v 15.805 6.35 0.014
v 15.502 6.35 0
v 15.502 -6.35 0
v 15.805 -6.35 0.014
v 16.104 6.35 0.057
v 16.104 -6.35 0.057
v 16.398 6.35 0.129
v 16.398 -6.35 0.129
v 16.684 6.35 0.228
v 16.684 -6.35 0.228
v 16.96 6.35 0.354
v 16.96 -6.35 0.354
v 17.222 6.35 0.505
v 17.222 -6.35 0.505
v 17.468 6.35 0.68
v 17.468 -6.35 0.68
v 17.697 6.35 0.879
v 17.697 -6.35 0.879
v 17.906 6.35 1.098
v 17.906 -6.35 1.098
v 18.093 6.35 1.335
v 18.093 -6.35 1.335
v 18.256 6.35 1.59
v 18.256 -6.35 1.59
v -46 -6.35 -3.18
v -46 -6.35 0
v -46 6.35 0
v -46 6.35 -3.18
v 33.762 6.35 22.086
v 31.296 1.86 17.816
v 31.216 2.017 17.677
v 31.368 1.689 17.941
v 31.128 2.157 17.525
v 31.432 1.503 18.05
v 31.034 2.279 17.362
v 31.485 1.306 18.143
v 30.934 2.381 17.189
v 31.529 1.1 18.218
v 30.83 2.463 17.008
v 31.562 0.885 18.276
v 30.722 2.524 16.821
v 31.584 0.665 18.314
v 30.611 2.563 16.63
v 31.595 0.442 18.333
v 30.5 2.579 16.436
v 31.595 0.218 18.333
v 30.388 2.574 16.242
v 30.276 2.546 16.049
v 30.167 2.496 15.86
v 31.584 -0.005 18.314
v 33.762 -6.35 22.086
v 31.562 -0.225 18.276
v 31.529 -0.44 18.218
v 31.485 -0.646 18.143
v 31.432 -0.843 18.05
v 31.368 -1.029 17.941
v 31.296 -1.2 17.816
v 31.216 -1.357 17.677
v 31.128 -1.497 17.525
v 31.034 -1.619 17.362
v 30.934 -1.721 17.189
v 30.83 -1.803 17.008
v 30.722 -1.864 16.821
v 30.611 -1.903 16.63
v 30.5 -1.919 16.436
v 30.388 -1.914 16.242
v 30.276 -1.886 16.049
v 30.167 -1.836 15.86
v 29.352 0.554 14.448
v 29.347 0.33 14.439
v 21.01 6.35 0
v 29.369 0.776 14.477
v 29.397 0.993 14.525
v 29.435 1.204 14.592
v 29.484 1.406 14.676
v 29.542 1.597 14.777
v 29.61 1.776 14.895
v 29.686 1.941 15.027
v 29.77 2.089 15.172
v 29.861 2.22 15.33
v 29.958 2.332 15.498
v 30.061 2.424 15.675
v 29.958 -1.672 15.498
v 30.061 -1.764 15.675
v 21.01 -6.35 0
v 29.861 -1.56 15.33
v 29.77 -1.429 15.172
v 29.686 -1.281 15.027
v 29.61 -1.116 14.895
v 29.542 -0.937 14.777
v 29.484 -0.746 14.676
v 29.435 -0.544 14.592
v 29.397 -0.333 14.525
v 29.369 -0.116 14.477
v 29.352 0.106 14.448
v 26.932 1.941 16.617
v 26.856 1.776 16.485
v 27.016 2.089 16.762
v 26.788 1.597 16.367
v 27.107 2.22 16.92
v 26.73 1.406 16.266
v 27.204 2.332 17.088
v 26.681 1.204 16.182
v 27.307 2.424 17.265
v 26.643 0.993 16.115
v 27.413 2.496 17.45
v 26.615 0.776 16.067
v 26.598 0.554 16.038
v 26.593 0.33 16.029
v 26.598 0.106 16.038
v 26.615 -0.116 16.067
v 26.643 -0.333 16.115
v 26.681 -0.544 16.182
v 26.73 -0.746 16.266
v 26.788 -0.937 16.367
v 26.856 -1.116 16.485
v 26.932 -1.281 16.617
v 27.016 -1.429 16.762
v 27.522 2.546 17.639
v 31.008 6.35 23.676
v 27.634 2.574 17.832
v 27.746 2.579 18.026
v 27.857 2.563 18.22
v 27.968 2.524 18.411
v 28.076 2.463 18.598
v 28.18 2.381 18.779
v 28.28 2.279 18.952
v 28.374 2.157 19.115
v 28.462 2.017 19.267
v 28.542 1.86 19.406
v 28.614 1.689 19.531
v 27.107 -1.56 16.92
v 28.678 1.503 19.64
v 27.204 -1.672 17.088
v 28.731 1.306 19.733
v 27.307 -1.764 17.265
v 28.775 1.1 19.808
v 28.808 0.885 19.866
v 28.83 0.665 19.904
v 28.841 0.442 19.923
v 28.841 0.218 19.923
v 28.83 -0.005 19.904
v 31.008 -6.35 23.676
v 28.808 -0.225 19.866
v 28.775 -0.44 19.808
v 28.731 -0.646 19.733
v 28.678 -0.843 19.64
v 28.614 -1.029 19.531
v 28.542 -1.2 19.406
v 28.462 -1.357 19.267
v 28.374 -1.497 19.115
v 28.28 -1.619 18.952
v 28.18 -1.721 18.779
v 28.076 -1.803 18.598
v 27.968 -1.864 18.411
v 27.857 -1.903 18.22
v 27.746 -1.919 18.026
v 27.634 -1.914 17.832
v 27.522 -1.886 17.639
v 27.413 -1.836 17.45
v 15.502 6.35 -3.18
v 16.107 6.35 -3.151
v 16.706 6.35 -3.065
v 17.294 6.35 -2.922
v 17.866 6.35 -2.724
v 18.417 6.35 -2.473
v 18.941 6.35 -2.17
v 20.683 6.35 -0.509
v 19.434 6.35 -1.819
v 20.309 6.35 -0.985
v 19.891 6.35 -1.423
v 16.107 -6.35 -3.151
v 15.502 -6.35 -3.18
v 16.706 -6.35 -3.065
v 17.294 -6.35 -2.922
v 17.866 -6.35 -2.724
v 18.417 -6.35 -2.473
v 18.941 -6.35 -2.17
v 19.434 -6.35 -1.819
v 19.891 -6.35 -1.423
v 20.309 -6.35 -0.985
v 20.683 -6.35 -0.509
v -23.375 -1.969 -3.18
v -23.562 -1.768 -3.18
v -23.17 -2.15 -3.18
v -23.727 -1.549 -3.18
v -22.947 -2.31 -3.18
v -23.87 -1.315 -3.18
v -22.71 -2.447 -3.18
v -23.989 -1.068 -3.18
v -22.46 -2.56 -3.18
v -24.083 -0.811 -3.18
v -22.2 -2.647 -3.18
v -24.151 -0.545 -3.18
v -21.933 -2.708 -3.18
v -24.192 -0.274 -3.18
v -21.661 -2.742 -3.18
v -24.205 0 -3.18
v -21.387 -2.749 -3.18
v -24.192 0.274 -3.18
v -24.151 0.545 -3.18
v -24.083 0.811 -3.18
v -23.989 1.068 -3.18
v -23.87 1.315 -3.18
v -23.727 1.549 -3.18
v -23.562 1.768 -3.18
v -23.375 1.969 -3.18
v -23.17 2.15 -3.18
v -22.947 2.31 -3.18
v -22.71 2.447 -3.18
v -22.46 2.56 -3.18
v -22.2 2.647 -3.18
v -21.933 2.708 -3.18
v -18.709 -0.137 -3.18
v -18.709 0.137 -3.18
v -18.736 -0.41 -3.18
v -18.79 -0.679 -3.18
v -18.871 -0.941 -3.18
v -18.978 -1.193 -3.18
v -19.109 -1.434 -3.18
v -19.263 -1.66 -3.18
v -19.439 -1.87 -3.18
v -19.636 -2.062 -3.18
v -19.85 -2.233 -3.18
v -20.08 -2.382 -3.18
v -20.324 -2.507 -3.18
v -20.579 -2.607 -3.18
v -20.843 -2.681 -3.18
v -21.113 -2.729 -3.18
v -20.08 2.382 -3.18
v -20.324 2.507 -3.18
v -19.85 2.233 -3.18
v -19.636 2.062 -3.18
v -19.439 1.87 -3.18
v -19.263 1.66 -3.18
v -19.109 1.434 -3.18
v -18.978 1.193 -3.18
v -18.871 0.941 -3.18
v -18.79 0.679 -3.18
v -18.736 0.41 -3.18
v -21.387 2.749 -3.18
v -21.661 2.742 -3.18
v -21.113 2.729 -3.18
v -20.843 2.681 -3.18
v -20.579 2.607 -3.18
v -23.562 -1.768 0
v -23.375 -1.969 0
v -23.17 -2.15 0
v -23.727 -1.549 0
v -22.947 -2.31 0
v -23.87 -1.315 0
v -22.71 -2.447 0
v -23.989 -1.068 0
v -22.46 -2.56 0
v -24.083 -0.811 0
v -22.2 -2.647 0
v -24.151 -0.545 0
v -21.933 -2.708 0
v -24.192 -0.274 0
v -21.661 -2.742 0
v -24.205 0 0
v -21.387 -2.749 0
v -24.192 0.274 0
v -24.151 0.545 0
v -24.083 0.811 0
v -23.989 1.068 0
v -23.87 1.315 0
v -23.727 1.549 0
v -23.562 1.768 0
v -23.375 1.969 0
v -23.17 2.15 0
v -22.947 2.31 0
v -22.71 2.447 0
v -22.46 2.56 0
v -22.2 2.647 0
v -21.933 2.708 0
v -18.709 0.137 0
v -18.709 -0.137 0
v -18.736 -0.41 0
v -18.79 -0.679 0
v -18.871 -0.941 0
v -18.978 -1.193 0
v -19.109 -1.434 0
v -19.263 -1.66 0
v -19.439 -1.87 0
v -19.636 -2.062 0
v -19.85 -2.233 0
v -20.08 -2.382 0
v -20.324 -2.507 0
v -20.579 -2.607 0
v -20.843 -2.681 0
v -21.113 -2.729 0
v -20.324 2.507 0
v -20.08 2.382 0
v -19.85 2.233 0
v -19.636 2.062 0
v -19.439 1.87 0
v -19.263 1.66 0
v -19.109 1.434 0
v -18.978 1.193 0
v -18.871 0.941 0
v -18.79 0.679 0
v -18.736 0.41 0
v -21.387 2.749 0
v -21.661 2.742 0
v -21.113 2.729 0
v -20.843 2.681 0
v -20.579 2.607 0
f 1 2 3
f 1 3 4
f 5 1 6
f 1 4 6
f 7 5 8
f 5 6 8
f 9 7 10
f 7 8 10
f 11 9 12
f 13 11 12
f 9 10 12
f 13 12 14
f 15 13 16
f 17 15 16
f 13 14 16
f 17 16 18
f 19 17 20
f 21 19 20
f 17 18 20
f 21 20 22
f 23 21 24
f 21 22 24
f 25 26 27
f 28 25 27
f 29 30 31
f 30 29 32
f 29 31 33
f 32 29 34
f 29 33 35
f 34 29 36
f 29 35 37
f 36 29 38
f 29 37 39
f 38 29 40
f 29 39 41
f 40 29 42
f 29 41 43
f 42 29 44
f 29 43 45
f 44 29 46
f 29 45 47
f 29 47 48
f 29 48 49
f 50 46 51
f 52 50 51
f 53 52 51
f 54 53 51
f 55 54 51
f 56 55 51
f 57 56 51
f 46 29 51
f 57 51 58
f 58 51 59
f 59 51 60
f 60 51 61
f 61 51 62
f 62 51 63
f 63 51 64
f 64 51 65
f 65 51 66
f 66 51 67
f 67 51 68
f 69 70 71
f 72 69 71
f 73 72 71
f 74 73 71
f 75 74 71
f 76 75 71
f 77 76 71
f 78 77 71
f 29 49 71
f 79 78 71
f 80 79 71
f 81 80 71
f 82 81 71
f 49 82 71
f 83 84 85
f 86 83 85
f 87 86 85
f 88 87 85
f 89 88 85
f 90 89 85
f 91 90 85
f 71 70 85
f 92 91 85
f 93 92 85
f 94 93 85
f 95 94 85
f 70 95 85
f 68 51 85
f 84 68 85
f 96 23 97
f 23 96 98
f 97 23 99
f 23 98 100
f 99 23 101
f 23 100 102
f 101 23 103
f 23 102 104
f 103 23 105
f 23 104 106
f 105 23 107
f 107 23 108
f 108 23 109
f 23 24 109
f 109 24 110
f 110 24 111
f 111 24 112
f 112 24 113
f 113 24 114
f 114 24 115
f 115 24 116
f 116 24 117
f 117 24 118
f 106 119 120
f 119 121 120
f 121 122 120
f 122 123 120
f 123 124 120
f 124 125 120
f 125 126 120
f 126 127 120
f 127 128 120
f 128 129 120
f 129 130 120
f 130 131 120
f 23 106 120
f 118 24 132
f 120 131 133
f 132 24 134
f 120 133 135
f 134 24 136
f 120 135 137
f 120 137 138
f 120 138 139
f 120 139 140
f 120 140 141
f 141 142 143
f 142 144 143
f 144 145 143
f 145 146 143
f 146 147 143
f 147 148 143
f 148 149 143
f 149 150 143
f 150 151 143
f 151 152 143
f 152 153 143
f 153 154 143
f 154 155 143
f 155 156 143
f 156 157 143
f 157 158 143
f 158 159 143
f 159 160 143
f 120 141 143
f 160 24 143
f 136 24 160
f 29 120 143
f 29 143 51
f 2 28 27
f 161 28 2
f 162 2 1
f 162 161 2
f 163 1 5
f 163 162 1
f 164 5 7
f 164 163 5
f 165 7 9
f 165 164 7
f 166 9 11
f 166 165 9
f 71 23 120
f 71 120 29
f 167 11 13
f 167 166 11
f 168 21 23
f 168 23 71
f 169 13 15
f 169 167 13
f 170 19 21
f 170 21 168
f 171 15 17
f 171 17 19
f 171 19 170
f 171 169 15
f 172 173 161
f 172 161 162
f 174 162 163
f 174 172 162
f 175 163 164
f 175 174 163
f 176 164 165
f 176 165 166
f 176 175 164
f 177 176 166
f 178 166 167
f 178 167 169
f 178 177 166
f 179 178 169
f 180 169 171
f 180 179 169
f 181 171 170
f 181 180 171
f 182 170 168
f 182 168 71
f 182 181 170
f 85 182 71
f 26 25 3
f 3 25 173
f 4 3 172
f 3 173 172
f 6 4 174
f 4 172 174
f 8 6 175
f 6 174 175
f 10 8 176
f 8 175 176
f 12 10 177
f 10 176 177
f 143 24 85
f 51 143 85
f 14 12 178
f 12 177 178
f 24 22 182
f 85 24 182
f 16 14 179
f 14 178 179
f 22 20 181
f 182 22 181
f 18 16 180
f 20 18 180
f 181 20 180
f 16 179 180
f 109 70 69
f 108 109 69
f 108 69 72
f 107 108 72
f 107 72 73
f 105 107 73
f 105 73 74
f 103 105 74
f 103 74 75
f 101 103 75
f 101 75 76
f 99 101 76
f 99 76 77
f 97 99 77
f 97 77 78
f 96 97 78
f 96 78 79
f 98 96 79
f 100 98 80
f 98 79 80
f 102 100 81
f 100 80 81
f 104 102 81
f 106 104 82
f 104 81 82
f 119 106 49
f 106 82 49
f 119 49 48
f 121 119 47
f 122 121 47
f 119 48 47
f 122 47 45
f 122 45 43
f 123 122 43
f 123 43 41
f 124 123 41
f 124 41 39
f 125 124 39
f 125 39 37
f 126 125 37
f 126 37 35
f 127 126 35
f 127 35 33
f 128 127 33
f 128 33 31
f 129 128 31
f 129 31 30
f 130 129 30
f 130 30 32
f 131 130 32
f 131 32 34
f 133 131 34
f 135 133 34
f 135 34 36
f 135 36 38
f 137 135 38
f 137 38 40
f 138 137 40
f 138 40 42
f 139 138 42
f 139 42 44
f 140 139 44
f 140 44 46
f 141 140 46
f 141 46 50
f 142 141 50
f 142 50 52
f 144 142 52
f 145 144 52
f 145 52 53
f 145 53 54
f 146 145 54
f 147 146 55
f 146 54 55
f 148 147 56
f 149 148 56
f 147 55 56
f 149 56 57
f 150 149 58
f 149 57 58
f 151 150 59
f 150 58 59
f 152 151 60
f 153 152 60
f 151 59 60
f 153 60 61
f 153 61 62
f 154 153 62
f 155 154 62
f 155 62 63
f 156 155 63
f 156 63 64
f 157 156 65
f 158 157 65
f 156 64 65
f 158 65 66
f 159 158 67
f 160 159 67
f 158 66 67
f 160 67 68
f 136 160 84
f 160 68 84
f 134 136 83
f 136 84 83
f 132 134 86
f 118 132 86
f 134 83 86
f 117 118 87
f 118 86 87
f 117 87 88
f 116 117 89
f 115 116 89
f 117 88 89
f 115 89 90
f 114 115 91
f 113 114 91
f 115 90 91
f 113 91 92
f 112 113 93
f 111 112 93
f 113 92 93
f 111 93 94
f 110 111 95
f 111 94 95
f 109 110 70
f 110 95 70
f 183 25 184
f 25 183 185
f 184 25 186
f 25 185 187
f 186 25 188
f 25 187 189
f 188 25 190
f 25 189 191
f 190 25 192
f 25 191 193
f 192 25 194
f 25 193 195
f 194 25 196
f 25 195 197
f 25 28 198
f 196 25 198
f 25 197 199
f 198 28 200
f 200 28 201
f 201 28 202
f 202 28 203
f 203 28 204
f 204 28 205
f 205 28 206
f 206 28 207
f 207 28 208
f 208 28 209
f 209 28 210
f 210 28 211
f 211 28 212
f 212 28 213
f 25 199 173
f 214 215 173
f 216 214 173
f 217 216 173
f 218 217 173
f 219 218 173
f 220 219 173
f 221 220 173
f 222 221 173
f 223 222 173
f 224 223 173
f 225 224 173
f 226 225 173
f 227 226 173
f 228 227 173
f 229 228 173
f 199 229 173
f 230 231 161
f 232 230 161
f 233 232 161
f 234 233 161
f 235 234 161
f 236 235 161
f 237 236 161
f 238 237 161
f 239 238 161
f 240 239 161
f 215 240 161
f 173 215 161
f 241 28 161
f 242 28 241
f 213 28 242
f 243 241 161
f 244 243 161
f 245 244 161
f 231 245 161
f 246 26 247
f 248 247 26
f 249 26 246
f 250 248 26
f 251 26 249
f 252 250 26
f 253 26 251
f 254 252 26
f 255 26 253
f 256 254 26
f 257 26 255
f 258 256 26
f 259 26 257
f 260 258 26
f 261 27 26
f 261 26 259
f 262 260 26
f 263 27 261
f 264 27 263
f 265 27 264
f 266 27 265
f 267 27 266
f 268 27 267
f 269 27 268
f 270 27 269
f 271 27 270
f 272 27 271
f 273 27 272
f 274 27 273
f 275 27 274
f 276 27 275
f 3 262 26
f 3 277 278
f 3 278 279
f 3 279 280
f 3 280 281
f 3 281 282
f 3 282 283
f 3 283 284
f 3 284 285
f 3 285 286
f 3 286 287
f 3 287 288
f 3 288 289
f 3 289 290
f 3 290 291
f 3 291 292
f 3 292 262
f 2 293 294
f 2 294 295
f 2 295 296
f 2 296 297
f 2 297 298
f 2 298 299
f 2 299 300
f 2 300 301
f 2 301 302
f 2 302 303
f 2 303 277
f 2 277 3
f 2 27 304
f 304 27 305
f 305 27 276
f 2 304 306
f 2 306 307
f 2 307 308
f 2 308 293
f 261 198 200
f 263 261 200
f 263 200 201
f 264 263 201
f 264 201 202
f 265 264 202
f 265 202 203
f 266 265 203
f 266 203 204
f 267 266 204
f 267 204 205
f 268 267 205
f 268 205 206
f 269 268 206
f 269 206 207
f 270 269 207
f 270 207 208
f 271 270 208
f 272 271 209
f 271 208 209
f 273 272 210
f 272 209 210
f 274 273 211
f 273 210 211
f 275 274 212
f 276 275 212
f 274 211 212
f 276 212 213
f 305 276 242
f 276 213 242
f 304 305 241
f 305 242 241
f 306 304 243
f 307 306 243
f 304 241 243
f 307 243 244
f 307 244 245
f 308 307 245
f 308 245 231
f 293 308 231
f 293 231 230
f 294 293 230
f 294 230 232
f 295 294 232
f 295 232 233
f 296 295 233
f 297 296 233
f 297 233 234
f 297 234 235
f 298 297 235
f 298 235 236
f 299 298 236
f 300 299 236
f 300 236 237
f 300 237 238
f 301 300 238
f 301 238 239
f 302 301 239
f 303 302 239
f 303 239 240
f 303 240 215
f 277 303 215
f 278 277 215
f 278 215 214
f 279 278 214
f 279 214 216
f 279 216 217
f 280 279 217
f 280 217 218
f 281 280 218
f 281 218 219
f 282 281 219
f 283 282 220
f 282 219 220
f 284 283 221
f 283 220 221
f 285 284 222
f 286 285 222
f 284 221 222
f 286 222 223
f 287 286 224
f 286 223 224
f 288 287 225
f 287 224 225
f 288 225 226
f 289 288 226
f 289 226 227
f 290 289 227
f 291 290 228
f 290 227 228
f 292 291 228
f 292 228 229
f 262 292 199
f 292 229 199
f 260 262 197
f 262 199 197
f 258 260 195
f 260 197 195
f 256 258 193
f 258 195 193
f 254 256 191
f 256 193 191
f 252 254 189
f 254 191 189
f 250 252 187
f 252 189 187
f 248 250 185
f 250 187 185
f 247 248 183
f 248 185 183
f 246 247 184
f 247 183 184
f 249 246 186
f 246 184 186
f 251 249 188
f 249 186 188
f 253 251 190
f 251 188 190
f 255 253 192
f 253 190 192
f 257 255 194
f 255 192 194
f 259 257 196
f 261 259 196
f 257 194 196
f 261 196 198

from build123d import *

# Parameters (mm, degrees)
ESBO_O1_W               = 92
ESBO_O1_H               = 12.7
FLANGE_BASE1_DEPTH      = 3.18
DOBRA_START             = -6.35
DOBRA_ESBO_ADA1_DEPTH   = 12.7
DOBRA_ESBO_ADA1_2_DEPTH = 12.7
ESBO_O8_R               = 2.75
CORTE_EXTRUS_O1_DEPTH   = 10
ESBO_O10_R              = 2.25
CORTE_EXTRUS_O3_DEPTH   = 10


# Read off the part's stored shape, not the designer's step: Dobra esboçada1
# Sheet-metal steps are written as plain solids
with BuildPart() as part:
    # Esboço1 → Flange-base1 (new body)
    with BuildSketch(Plane.XY):
        Rectangle(ESBO_O1_W, ESBO_O1_H)
    extrude(amount=-FLANGE_BASE1_DEPTH)

    # Dobra esboçada1 outline → Dobra esboçada1 (cut)
    with BuildSketch(Plane(origin=(0, 0, 0), x_dir=(1, 0, 0), z_dir=(0, 1, 0)).offset(DOBRA_START)):
        with BuildLine():
            ThreePointArc((15.50243384, 3.18), (18.68243384, 2.327921568), (21.010355408, 0))
            Line((21.010355408, 0), (46, 0))
            Line((46, 0), (46, 3.18))
            Line((46, 3.18), (15.50243384, 3.18))
        make_face()
    extrude(amount=DOBRA_ESBO_ADA1_DEPTH, mode=Mode.SUBTRACT)

    # Dobra esbo_ada1 2 outline → Dobra esbo_ada1 2 (add)
    with BuildSketch(Plane(origin=(0, 0, 0), x_dir=(1, 0, 0), z_dir=(0, 1, 0)).offset(DOBRA_START)):
        with BuildLine():
            Line((18.256394624, -1.59), (31.007611545, -23.675755564))
            Line((31.007611545, -23.675755564), (33.761572329, -22.085755564))
            Line((33.761572329, -22.085755564), (21.010355408, 0))
            Line((21.010355408, 0), (15.50243384, 0))
            ThreePointArc((15.50243384, 0), (17.09243384, -0.426039216), (18.256394624, -1.59))
        make_face()
    extrude(amount=DOBRA_ESBO_ADA1_2_DEPTH)

    # Esboço8 → Corte-extrusão1 (cut)
    with BuildSketch(Plane(origin=(0, 0, -3.18), x_dir=(-1, 0, 0), z_dir=(0, 0, -1))):
        with Locations((21.455259123, 0)):
            Circle(ESBO_O8_R)
    extrude(amount=-CORTE_EXTRUS_O1_DEPTH, mode=Mode.SUBTRACT)

    # Esboço10 → Corte-extrusão3 (cut)
    with BuildSketch(Plane(origin=(15.757766556, 0, -9.097750763), x_dir=(-0.49999999999999806, 0, -0.8660254037844398), z_dir=(0.8660254037844397, 0, -0.499999999999998))):
        with Locations((-29.427611545, 0.33)):
            Circle(ESBO_O10_R)
    extrude(amount=-CORTE_EXTRUS_O3_DEPTH, mode=Mode.SUBTRACT)


solid = part.part
